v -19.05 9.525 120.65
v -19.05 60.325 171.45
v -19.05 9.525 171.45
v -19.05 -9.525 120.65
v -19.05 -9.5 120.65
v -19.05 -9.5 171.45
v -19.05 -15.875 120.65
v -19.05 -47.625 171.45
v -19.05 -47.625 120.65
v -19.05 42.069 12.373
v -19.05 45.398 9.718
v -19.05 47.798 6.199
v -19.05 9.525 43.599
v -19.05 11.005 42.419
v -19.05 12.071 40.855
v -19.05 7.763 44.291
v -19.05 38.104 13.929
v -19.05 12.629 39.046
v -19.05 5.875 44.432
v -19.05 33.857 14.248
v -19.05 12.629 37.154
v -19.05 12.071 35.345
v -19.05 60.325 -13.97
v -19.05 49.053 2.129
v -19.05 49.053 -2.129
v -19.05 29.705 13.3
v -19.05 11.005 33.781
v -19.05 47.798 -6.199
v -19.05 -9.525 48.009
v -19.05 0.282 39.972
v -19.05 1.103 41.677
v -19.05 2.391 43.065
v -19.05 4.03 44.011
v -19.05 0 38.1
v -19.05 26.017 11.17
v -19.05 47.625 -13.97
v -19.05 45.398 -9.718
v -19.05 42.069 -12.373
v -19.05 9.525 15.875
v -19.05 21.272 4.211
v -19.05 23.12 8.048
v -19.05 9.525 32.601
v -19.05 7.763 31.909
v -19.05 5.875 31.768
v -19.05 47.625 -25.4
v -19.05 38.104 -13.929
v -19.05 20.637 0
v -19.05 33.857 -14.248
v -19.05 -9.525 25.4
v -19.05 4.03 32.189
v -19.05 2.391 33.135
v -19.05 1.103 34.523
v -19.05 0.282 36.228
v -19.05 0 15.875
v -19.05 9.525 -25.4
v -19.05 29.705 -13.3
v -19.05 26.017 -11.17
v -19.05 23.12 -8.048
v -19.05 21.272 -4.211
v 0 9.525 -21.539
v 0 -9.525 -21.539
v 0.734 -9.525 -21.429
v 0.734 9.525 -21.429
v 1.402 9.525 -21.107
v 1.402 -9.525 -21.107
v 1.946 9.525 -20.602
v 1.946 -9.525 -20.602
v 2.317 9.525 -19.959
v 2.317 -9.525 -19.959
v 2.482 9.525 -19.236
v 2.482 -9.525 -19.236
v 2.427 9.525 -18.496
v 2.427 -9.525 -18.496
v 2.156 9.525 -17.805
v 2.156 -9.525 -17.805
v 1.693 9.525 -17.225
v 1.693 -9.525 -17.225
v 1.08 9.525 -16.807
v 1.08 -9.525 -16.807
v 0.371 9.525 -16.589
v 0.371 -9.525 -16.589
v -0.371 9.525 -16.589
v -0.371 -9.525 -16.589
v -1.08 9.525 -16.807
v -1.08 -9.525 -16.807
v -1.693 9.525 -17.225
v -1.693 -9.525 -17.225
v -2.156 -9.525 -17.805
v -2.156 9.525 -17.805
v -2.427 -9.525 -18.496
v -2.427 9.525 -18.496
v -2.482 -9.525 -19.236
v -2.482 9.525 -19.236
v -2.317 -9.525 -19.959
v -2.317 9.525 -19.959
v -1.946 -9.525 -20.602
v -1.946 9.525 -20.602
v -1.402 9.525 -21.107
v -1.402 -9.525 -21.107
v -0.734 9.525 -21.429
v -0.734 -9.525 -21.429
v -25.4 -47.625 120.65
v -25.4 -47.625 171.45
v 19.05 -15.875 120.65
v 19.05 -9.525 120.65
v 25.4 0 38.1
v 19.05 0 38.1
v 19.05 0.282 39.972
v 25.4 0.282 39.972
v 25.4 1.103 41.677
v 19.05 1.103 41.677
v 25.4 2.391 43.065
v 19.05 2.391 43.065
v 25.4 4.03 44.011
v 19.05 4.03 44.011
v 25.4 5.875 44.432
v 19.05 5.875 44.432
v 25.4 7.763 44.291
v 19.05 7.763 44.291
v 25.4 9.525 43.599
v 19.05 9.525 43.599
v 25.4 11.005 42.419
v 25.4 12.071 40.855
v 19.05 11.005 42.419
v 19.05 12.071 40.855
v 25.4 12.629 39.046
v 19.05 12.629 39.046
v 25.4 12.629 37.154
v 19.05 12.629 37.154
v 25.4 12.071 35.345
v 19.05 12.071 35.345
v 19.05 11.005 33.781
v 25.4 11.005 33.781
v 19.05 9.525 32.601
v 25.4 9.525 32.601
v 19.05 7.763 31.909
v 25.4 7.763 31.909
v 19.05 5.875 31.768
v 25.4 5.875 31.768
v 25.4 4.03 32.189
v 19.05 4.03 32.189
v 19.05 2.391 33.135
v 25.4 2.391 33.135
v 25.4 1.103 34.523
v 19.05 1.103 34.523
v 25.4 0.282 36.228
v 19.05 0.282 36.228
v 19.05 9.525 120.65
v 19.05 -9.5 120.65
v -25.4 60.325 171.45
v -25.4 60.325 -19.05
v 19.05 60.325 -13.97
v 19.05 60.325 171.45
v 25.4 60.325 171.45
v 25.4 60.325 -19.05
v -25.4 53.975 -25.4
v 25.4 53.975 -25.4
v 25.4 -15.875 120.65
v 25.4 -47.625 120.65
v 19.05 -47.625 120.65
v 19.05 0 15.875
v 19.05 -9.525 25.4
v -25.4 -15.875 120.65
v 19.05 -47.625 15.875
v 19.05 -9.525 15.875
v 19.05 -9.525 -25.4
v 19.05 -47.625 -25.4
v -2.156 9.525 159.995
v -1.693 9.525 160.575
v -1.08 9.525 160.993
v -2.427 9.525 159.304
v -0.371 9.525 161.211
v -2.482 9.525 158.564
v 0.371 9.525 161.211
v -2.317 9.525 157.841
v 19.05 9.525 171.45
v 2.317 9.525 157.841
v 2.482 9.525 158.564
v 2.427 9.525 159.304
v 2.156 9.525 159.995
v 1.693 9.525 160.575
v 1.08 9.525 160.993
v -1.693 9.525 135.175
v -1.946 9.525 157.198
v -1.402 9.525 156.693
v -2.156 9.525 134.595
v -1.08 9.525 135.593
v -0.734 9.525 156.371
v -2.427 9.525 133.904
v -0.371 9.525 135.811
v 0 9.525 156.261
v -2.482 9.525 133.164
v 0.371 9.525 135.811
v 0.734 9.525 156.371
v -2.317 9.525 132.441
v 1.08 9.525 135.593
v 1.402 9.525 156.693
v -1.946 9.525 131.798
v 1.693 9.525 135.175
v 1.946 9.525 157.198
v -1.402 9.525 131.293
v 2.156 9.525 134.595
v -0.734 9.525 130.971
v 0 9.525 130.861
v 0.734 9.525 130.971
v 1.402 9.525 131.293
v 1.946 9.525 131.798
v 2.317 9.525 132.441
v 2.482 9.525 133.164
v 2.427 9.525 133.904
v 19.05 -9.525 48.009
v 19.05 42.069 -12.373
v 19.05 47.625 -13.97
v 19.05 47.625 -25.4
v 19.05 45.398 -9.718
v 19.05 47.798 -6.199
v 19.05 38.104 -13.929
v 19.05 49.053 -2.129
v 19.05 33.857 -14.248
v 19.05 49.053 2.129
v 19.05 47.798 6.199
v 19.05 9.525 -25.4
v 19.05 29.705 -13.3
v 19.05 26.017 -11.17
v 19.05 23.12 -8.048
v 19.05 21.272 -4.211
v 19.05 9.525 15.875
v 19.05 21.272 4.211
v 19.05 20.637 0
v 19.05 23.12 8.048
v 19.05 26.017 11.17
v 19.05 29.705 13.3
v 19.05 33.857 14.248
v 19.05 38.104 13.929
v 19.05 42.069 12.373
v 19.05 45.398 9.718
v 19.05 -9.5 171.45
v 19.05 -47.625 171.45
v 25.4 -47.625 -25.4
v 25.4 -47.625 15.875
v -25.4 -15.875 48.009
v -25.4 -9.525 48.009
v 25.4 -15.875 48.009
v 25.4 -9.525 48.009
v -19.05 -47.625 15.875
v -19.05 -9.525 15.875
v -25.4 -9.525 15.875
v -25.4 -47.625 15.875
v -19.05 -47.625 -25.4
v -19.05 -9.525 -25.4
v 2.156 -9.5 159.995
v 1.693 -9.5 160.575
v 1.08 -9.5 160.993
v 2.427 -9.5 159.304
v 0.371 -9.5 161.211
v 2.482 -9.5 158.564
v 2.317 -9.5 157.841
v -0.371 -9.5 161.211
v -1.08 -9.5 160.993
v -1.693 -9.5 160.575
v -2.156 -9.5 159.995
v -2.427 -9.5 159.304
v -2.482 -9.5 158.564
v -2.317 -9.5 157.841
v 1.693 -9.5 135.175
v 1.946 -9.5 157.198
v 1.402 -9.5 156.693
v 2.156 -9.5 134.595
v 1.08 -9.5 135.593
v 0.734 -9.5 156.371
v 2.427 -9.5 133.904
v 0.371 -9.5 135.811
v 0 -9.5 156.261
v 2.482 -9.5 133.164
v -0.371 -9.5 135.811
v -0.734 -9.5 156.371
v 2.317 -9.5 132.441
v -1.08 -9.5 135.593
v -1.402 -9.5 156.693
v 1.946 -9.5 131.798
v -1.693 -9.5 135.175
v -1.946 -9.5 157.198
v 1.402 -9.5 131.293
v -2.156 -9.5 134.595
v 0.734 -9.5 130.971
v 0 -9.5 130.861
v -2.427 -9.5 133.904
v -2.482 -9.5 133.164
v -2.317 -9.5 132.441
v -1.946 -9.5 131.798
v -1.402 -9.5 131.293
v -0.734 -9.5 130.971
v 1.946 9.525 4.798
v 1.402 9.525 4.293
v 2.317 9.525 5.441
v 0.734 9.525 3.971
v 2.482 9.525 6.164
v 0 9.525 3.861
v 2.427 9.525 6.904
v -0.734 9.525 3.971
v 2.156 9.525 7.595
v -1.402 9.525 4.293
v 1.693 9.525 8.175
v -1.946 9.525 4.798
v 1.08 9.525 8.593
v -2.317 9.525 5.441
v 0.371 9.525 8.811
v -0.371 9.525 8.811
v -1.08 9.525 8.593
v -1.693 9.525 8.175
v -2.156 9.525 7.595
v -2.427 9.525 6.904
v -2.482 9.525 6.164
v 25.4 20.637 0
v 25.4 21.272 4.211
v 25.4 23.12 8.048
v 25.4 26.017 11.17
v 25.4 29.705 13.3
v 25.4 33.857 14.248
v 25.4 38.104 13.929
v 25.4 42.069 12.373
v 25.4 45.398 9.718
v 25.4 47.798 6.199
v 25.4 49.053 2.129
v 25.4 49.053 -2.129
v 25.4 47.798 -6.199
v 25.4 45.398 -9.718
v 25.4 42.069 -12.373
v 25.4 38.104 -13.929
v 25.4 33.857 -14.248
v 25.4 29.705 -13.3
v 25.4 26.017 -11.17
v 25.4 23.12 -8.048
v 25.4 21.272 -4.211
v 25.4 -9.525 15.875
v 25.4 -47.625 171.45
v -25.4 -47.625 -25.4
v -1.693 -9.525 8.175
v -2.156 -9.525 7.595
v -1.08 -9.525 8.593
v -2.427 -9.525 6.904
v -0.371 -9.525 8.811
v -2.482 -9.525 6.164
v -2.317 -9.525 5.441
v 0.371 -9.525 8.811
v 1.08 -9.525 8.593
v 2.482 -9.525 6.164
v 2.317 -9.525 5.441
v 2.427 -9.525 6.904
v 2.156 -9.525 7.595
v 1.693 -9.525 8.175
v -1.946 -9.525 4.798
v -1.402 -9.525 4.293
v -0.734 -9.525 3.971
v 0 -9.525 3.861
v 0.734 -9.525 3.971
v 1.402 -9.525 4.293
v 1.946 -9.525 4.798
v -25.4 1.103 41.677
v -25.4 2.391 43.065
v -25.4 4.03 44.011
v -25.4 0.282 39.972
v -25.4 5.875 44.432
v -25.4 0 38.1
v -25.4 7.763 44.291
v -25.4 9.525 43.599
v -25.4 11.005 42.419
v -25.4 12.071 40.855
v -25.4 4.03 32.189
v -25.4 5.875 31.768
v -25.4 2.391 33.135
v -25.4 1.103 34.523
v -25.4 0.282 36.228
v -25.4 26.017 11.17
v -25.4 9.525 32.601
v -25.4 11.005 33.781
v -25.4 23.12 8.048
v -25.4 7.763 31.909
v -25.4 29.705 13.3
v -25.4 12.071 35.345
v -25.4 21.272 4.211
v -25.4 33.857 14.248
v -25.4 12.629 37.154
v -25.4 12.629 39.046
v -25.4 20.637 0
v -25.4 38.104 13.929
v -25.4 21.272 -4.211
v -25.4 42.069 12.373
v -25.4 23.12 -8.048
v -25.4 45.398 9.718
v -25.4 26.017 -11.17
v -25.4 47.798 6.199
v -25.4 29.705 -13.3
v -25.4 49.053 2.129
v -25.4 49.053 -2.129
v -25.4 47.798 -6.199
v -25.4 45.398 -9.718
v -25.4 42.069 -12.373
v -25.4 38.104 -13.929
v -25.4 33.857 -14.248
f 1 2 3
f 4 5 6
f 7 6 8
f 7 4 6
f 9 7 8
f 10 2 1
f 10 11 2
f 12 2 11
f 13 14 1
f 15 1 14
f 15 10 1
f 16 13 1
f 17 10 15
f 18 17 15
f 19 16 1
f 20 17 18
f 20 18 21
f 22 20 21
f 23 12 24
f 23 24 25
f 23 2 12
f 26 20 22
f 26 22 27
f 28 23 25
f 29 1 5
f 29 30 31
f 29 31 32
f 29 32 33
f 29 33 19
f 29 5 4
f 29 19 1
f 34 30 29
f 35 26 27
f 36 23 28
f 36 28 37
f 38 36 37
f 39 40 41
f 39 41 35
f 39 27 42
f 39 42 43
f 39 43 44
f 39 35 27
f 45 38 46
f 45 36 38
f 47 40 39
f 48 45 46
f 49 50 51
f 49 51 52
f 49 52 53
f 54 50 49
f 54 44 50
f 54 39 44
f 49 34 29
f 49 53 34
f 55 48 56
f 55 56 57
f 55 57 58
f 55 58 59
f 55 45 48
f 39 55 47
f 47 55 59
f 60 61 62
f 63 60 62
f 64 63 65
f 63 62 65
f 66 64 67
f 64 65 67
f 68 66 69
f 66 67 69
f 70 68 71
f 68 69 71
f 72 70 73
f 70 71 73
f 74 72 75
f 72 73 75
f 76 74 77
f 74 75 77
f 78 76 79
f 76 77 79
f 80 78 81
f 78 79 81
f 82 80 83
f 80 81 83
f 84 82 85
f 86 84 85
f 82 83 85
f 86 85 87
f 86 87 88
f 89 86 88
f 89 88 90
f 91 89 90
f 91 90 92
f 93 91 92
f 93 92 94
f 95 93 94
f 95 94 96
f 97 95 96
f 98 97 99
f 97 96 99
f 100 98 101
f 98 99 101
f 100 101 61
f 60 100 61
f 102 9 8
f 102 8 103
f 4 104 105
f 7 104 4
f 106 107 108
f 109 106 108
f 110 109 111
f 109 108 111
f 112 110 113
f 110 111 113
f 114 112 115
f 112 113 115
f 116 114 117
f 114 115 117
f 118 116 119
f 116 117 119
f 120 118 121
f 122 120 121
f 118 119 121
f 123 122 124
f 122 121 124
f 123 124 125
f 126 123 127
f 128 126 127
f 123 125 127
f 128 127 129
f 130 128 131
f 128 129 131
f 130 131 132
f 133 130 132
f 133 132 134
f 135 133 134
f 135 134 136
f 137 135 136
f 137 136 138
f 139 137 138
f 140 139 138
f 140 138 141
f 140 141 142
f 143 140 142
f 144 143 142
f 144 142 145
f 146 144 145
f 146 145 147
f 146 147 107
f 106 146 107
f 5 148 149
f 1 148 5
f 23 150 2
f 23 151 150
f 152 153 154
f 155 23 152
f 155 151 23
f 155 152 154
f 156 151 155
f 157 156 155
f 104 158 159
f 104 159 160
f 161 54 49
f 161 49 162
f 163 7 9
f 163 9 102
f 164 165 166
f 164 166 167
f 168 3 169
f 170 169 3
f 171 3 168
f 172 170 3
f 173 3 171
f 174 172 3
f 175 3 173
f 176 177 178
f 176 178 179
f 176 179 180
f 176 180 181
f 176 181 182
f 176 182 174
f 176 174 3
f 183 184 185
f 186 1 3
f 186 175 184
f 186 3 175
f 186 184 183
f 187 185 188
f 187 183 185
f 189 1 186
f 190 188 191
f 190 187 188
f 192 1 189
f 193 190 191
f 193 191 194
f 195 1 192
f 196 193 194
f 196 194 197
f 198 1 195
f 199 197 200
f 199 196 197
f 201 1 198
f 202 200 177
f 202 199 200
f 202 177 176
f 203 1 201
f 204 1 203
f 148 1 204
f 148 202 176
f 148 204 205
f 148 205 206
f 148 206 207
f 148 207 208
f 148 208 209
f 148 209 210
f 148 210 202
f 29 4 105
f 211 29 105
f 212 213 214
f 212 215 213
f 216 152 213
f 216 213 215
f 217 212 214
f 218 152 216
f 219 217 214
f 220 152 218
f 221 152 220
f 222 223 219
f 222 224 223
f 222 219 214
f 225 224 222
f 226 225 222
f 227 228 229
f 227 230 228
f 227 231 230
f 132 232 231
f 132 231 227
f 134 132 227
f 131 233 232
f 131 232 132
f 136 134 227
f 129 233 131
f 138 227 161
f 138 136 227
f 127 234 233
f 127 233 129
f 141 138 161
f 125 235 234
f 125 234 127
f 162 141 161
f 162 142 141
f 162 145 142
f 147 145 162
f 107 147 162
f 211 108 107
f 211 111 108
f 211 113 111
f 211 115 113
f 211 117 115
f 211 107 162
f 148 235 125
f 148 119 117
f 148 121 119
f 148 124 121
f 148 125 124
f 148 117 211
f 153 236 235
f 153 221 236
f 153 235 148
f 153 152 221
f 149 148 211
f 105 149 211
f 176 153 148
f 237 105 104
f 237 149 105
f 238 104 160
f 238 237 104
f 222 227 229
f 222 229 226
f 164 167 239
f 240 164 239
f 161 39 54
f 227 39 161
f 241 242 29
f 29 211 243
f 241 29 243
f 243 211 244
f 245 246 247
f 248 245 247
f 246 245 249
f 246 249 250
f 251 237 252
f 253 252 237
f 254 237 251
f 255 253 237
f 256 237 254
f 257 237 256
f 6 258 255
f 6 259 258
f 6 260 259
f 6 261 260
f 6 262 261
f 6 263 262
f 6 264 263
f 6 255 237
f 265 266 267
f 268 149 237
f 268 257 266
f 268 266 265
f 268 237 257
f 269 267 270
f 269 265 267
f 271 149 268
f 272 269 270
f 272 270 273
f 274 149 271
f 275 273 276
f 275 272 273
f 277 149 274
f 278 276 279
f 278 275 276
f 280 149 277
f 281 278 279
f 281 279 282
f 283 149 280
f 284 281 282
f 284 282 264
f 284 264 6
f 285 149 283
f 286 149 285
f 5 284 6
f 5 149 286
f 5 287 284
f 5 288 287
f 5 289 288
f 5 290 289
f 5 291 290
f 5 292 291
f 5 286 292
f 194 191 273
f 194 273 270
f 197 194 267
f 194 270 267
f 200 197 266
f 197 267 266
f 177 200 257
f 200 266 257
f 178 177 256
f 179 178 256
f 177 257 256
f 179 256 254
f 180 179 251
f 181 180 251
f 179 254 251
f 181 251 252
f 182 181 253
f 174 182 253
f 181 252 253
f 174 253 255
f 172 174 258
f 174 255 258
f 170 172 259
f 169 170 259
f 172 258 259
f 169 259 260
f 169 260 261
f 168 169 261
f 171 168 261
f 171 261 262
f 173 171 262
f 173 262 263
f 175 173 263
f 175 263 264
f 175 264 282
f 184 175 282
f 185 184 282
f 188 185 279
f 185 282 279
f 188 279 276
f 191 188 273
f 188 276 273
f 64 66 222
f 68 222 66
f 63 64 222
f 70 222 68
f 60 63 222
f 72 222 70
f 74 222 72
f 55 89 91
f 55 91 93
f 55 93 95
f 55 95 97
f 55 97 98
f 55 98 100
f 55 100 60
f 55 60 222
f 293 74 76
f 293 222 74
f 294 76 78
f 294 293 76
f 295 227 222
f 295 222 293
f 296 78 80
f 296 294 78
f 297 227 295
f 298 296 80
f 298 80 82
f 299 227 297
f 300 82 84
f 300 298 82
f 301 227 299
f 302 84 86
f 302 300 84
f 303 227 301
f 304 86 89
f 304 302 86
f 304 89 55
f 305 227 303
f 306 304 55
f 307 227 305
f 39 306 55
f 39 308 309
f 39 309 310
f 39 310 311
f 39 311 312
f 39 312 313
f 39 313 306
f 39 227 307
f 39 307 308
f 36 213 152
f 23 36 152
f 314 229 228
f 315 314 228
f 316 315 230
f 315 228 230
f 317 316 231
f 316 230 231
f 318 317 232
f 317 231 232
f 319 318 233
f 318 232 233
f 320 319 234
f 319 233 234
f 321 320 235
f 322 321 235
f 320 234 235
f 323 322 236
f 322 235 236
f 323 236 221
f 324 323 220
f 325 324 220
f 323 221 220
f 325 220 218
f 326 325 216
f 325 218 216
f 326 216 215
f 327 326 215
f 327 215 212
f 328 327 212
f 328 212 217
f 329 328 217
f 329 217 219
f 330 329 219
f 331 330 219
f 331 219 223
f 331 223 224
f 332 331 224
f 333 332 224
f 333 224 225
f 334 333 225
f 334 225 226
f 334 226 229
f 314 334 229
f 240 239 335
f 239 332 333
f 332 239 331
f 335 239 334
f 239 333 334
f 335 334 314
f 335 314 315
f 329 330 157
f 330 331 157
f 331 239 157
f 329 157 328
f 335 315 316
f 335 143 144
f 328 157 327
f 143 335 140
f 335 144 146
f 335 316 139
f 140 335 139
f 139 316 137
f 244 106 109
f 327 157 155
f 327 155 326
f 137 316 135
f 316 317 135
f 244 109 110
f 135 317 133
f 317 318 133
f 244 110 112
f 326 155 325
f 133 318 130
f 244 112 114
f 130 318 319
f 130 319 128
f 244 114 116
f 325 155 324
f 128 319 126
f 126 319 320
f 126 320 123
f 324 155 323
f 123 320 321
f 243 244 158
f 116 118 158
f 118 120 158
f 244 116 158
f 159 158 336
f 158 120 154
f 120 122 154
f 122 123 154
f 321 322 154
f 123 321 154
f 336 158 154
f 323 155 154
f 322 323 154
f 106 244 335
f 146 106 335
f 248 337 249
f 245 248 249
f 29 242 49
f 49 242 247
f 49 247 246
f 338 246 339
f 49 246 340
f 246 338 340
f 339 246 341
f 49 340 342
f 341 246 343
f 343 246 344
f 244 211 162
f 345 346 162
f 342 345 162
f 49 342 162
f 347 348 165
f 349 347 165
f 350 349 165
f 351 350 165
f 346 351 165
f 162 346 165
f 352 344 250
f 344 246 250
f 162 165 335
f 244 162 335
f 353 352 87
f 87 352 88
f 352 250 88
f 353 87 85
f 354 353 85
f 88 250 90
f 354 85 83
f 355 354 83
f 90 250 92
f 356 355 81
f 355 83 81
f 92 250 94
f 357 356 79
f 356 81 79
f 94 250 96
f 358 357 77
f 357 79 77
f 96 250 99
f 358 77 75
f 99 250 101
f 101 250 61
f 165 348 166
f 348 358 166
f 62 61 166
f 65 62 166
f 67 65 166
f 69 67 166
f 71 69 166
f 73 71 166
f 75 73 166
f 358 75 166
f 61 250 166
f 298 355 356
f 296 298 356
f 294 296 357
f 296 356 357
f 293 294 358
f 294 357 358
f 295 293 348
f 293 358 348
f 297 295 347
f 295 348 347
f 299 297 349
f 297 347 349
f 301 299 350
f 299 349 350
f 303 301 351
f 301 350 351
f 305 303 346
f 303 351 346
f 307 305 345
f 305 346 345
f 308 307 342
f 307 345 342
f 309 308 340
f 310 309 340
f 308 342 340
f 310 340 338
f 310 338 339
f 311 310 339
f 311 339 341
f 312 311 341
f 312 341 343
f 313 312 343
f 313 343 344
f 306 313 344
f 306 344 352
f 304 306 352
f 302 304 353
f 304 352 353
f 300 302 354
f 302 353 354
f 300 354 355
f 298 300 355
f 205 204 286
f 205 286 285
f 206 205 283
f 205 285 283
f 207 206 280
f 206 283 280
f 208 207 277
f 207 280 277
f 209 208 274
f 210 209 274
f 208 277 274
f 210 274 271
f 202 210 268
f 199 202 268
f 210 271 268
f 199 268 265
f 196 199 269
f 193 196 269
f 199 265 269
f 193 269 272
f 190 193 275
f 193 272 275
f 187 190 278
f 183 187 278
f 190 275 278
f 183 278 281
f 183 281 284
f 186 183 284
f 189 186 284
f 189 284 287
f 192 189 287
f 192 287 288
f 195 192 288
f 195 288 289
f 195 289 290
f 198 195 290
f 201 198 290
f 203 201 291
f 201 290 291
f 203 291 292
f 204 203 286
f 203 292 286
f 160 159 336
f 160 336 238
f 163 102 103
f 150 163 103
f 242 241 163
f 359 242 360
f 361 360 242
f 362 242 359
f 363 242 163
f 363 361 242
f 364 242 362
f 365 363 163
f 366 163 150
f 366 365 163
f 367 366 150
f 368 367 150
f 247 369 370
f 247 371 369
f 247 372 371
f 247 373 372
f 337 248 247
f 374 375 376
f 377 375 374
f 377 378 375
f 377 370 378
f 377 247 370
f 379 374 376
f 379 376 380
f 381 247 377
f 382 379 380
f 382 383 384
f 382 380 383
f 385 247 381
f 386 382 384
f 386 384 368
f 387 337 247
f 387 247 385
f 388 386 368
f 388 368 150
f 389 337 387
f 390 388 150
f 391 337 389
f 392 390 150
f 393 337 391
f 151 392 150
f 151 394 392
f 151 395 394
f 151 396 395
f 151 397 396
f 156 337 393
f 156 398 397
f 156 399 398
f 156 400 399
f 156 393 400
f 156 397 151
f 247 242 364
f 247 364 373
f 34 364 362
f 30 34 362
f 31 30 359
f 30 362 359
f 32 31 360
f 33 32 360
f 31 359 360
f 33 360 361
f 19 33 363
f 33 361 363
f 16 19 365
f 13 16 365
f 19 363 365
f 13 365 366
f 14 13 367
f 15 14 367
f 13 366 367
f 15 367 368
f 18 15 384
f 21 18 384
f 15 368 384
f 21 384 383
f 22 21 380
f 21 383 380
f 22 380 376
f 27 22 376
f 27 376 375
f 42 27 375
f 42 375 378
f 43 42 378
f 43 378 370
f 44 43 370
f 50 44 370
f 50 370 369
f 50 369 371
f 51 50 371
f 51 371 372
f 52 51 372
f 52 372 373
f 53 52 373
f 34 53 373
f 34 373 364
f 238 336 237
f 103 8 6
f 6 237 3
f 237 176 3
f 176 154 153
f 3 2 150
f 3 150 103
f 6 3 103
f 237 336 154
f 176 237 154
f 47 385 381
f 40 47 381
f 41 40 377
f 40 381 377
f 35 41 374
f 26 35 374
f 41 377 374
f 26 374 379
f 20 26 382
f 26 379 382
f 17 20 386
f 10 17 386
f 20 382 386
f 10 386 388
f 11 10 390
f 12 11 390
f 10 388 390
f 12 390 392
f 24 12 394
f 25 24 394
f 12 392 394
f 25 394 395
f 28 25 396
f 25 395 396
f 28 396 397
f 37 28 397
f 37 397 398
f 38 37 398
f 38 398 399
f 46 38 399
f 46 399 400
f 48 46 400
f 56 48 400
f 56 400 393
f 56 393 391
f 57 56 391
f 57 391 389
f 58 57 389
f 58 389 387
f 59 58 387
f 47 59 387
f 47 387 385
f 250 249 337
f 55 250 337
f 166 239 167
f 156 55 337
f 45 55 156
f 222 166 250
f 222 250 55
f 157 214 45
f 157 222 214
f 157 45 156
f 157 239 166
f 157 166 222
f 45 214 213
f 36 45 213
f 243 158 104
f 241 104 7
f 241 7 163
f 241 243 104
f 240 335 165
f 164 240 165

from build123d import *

# Parameters (mm, degrees)
BOSS_EXTRUDE1_DEPTH = 25.4
SKETCH2_R           = 14.2875
CUT_EXTRUDE1_DEPTH  = 83.854726027
SKETCH3_W           = 50.8
SKETCH3_H           = 38.1
CUT_EXTRUDE3_DEPTH  = 9.525
SKETCH4_W           = 11.43
SKETCH4_H           = 12.7
BOSS_EXTRUDE2_DEPTH = 38.1
CHAMFER1_SIZE       = 6.35
SKETCH5_W           = 6.35
SKETCH5_H           = 69.85
BOSS_EXTRUDE3_DEPTH = 95.25
SKETCH7_R           = 6.35
CUT_EXTRUDE5_DEPTH  = 145.139405178
SKETCH8_W           = 38.1
SKETCH8_H           = 9.525
CUT_EXTRUDE6_DEPTH  = 9.525
CHAMFER4_SIZE       = 9.525
SKETCH10_W          = 50.8
SKETCH10_H          = 72.641150816
BOSS_EXTRUDE5_DEPTH = 6.35
BOSS_EXTRUDE9_DEPTH = 50.8
SKETCH13_W          = 38.1
SKETCH13_H          = 50.8
CUT_EXTRUDE8_DEPTH  = 6.3754
SKETCH14_R          = 2.4892
CUT_EXTRUDE9_DEPTH  = 19.05
SKETCH15_R          = 2.4892
CUT_EXTRUDE10_DEPTH = 19.0246


with BuildPart() as part:
    # Sketch1 → Boss-Extrude1 (new, symmetric)
    with BuildSketch(Plane.XY):
        Polygon((-25.4, -47.625), (-19.05, -47.625), (-19.05, -9.525), (19.05, -9.525), (19.05, -47.625), (25.4, -47.625), (25.4, 60.325), (19.05, 60.325), (19.05, 9.525), (-19.05, 9.525), (-19.05, 60.325), (-25.4, 60.325), align=None)
    extrude(amount=BOSS_EXTRUDE1_DEPTH, both=True)

    # Sketch2 → Cut-Extrude1 (cut, through all)
    with BuildSketch(Plane.ZY.offset(25.4)):
        with Locations(Location((0, 34.925, 0), (0, 0, 270))):
            Circle(SKETCH2_R)
    extrude(amount=-CUT_EXTRUDE1_DEPTH, mode=Mode.SUBTRACT)

    # Sketch3 → Cut-Extrude3 (cut)
    with BuildSketch(Plane(origin=(0, 0, 25.4), x_dir=(-1, 0, 0), z_dir=(0, 0, -1))):
        with Locations((0, -28.575)):
            Rectangle(SKETCH3_W, SKETCH3_H)
    extrude(amount=CUT_EXTRUDE3_DEPTH, mode=Mode.SUBTRACT)

    # Sketch4 → Boss-Extrude2 (add)
    with BuildSketch(Plane.ZY.offset(-19.05)):
        with Locations((-19.685, 53.975)):
            Rectangle(SKETCH4_W, SKETCH4_H)
    extrude(amount=BOSS_EXTRUDE2_DEPTH)

    # Chamfer1
    chamfer1_edges = [part.edges().sort_by_distance(p)[0] for p in [
        (0, 60.325, -25.4),
    ]]
    chamfer(chamfer1_edges, length=CHAMFER1_SIZE)

    # Sketch5 → Boss-Extrude3 (add)
    with BuildSketch(Plane.XY.offset(25.4)):
        with Locations((-22.225, 25.4)):
            Rectangle(SKETCH5_W, SKETCH5_H)
        with Locations((22.225, 25.4)):
            Rectangle(SKETCH5_W, SKETCH5_H)
    extrude(amount=BOSS_EXTRUDE3_DEPTH)

    # Sketch7 → Cut-Extrude5 (cut, through all)
    with BuildSketch(Plane.ZY.offset(25.4)):
        with Locations(Location((38.1, 6.35, 0), (0, 0, 270))):
            Circle(SKETCH7_R)
    extrude(amount=-CUT_EXTRUDE5_DEPTH, mode=Mode.SUBTRACT)

    # Sketch8 → Cut-Extrude6 (cut)
    with BuildSketch(Plane.XY.offset(25.4)):
        with Locations((0, 4.7625)):
            Rectangle(SKETCH8_W, SKETCH8_H)
    extrude(amount=-CUT_EXTRUDE6_DEPTH, mode=Mode.SUBTRACT)

    # Chamfer4
    chamfer4_edges = [part.edges().sort_by_distance(p)[0] for p in [
        (0, 0, 25.4),
    ]]
    chamfer(chamfer4_edges, length=CHAMFER4_SIZE - 0.0001)  # a hair under: the kernel refuses the full size

    # Sketch10 → Boss-Extrude5 (add)
    with BuildSketch(Plane.XZ.offset(9.525)):
        with Locations((0, 84.329424592)):
            Rectangle(SKETCH10_W, SKETCH10_H)
    extrude(amount=BOSS_EXTRUDE5_DEPTH)

    # Sketch12 → Boss-Extrude9 (add)
    with BuildSketch(Plane.XY.offset(120.65)):
        Polygon((-25.4, 60.325), (-19.05, 60.325), (-19.05, 9.525), (19.05, 9.525), (19.05, 60.325), (25.4, 60.325), (25.4, -47.625), (19.05, -47.625), (19.05, -15.875), (-19.05, -15.875), (-19.05, -47.625), (-25.4, -47.625), align=None)
    extrude(amount=BOSS_EXTRUDE9_DEPTH)

    # Sketch13 → Cut-Extrude8 (cut)
    with BuildSketch(Plane(origin=(0, -15.875, 0), x_dir=(-1, 0, 0), z_dir=(0, -1, 0))):
        with Locations((0, -146.05)):
            Rectangle(SKETCH13_W, SKETCH13_H)
    extrude(amount=-CUT_EXTRUDE8_DEPTH, mode=Mode.SUBTRACT)

    # Sketch14 → Cut-Extrude9 (cut)
    with BuildSketch(Plane.XZ.offset(9.525)):
        with Locations(Location((0, -19.05, 0), (0, 0, 270))):
            Circle(SKETCH14_R)
        with Locations(Location((0, 6.35, 0), (0, 0, 270))):
            Circle(SKETCH14_R)
    extrude(amount=-CUT_EXTRUDE9_DEPTH, mode=Mode.SUBTRACT)

    # Sketch15 → Cut-Extrude10 (cut)
    with BuildSketch(Plane.XZ.offset(9.4996)):
        with Locations(Location((0, 158.75, 0), (0, 0, 270))):
            Circle(SKETCH15_R)
        with Locations(Location((0, 133.35, 0), (0, 0, 270))):
            Circle(SKETCH15_R)
    extrude(amount=-CUT_EXTRUDE10_DEPTH, mode=Mode.SUBTRACT)


solid = part.part
